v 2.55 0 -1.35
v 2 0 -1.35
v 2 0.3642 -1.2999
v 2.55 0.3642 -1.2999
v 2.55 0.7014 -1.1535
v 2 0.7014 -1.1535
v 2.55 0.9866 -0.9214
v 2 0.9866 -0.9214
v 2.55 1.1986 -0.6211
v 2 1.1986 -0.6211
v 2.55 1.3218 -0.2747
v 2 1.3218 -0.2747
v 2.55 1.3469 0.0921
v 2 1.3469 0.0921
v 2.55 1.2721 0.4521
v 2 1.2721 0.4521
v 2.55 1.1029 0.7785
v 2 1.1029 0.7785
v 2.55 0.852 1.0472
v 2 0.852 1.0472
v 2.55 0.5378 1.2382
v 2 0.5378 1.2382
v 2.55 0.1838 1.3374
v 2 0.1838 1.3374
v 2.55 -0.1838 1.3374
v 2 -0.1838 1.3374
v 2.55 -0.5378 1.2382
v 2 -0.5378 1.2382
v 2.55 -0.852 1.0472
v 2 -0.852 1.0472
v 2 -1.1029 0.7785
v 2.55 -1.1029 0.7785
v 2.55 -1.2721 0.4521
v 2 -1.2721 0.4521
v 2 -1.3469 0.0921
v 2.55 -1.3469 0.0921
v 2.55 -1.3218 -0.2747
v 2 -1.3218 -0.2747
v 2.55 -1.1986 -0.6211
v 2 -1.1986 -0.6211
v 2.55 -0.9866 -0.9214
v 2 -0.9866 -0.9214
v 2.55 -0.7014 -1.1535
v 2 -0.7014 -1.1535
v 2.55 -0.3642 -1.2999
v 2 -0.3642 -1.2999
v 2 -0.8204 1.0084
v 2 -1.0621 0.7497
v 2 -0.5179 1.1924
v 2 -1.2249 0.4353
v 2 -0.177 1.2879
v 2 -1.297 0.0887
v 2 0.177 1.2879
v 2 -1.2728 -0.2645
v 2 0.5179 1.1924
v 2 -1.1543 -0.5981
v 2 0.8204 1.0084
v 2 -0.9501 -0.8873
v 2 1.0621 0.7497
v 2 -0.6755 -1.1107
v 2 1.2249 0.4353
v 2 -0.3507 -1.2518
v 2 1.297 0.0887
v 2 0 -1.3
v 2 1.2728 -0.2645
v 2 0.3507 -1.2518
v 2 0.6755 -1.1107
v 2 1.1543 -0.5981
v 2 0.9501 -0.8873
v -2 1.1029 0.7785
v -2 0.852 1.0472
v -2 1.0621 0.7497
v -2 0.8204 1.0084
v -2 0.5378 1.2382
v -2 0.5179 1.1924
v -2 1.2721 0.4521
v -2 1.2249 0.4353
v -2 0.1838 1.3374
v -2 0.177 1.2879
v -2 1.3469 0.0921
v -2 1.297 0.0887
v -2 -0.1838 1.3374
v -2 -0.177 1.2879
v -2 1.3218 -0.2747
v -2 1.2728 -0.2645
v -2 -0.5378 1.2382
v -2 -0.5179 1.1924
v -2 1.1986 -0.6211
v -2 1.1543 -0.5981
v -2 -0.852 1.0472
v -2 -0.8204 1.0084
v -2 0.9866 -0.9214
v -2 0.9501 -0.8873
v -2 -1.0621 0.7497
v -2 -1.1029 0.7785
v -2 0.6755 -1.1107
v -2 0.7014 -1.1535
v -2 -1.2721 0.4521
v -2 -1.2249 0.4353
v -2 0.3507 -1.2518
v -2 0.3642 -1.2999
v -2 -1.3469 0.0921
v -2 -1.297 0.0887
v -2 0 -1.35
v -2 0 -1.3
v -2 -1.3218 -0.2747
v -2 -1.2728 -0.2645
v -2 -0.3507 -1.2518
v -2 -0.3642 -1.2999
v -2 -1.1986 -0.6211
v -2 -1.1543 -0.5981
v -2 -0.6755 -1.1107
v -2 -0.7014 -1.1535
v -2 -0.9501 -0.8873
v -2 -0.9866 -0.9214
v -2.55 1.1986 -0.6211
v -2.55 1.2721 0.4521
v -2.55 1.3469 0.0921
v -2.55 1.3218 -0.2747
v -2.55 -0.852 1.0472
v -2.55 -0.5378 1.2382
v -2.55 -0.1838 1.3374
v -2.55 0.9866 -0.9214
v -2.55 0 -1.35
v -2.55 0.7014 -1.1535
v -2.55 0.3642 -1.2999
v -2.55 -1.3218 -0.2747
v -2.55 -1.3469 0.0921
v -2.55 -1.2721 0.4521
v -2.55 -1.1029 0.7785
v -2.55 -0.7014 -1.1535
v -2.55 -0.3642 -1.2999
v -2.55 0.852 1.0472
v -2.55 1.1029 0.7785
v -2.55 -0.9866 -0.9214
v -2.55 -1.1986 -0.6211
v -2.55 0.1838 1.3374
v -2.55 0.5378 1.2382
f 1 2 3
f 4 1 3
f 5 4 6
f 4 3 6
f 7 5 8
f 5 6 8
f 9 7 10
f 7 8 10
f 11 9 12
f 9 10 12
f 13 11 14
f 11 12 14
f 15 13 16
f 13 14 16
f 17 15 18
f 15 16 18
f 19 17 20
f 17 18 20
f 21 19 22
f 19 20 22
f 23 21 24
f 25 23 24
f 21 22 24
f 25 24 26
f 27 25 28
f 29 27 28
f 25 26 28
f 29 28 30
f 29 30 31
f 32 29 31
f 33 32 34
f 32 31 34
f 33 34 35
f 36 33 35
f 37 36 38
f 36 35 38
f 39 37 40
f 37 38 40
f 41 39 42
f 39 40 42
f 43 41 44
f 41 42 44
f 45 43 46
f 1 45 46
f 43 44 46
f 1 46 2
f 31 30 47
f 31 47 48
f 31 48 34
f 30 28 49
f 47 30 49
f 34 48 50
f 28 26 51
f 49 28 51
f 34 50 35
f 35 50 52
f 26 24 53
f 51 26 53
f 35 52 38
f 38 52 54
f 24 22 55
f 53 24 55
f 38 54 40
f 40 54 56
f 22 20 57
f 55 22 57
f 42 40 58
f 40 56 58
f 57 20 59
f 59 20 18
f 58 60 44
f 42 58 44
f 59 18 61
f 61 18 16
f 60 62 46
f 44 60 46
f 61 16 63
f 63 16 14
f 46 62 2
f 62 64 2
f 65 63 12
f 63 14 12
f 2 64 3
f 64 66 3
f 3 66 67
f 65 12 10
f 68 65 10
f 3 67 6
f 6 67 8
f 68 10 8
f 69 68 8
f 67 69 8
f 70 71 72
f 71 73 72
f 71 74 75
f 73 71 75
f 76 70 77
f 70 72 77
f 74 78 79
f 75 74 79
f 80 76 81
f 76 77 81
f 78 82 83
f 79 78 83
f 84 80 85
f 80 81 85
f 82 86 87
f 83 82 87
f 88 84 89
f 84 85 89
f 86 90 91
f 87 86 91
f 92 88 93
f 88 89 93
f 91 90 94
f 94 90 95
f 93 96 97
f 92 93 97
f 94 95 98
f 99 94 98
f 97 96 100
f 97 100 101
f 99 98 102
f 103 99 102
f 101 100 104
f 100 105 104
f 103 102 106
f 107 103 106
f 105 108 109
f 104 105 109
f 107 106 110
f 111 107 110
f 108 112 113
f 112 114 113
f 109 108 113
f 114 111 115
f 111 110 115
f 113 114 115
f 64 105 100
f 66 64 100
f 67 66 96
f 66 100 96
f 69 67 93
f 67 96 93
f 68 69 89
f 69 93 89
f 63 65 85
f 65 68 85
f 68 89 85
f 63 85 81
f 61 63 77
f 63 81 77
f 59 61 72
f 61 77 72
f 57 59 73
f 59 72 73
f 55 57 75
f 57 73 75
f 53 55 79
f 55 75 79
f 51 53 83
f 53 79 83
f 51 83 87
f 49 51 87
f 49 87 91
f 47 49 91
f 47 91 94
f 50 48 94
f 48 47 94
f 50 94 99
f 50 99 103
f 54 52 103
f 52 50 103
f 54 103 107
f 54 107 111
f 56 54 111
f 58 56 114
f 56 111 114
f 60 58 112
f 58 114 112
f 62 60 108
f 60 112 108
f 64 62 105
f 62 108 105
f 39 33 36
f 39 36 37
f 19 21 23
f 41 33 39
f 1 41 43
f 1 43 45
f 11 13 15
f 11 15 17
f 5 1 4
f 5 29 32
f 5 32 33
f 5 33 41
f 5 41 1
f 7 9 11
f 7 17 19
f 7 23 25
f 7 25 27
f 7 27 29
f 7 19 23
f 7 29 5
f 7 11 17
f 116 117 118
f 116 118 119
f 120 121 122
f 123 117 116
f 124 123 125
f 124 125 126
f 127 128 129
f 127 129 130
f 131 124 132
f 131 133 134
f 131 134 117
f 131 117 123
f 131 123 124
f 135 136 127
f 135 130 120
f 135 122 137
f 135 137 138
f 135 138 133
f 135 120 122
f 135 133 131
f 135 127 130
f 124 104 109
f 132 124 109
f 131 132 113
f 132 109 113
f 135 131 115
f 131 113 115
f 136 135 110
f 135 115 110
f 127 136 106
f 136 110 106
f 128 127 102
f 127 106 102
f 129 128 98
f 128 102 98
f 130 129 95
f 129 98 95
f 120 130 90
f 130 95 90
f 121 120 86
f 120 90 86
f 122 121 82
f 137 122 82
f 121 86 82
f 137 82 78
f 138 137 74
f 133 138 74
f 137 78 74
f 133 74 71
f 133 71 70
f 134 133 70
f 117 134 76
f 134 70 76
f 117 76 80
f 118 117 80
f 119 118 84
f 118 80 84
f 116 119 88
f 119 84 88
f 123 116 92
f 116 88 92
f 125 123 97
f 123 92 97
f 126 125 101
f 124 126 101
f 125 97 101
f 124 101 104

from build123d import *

# Parameters (mm, degrees)
EXTRUDE_1_DEPTH      = 2.5
EXTRUDE_1_DEPTH_BACK = 2.5
SKETCH_1_R           = 1.3
EXTRUDE_3_DEPTH      = 0.05
EXTRUDE_3_DEPTH_BACK = 0.5
SKETCH_6_R           = 1.35
EXTRUDE_4_DEPTH      = 0.05
EXTRUDE_4_DEPTH_BACK = 0.5
SKETCH_8_R           = 1.35


with BuildPart() as part:
    # Эскиз1 → Бобышка-Вытянуть1 (new, two sides: drawn at the far end of the back side and taken through both)
    with BuildSketch(Plane(origin=(0, 0, 0), x_dir=(0, 0, -1), z_dir=(1, 0, 0)).offset(-EXTRUDE_1_DEPTH_BACK)):
        Circle(SKETCH_1_R)
    extrude(amount=EXTRUDE_1_DEPTH + EXTRUDE_1_DEPTH_BACK)

    # Эскиз6 → Бобышка-Вытянуть3 (add, two sides: drawn at the far end of the back side and taken through both)
    with BuildSketch(Plane(origin=(2.5, 0, 0), x_dir=(0, 0, -1), z_dir=(1, 0, 0)).offset(-EXTRUDE_3_DEPTH_BACK)):
        Circle(SKETCH_6_R)
    extrude(amount=EXTRUDE_3_DEPTH + EXTRUDE_3_DEPTH_BACK)

    # Эскиз8 → Бобышка-Вытянуть4 (add, two sides: drawn at the far end of the back side and taken through both)
    with BuildSketch(Plane.ZY.offset(2.5).offset(-EXTRUDE_4_DEPTH_BACK)):
        Circle(SKETCH_8_R)
    extrude(amount=EXTRUDE_4_DEPTH + EXTRUDE_4_DEPTH_BACK)


solid = part.part
